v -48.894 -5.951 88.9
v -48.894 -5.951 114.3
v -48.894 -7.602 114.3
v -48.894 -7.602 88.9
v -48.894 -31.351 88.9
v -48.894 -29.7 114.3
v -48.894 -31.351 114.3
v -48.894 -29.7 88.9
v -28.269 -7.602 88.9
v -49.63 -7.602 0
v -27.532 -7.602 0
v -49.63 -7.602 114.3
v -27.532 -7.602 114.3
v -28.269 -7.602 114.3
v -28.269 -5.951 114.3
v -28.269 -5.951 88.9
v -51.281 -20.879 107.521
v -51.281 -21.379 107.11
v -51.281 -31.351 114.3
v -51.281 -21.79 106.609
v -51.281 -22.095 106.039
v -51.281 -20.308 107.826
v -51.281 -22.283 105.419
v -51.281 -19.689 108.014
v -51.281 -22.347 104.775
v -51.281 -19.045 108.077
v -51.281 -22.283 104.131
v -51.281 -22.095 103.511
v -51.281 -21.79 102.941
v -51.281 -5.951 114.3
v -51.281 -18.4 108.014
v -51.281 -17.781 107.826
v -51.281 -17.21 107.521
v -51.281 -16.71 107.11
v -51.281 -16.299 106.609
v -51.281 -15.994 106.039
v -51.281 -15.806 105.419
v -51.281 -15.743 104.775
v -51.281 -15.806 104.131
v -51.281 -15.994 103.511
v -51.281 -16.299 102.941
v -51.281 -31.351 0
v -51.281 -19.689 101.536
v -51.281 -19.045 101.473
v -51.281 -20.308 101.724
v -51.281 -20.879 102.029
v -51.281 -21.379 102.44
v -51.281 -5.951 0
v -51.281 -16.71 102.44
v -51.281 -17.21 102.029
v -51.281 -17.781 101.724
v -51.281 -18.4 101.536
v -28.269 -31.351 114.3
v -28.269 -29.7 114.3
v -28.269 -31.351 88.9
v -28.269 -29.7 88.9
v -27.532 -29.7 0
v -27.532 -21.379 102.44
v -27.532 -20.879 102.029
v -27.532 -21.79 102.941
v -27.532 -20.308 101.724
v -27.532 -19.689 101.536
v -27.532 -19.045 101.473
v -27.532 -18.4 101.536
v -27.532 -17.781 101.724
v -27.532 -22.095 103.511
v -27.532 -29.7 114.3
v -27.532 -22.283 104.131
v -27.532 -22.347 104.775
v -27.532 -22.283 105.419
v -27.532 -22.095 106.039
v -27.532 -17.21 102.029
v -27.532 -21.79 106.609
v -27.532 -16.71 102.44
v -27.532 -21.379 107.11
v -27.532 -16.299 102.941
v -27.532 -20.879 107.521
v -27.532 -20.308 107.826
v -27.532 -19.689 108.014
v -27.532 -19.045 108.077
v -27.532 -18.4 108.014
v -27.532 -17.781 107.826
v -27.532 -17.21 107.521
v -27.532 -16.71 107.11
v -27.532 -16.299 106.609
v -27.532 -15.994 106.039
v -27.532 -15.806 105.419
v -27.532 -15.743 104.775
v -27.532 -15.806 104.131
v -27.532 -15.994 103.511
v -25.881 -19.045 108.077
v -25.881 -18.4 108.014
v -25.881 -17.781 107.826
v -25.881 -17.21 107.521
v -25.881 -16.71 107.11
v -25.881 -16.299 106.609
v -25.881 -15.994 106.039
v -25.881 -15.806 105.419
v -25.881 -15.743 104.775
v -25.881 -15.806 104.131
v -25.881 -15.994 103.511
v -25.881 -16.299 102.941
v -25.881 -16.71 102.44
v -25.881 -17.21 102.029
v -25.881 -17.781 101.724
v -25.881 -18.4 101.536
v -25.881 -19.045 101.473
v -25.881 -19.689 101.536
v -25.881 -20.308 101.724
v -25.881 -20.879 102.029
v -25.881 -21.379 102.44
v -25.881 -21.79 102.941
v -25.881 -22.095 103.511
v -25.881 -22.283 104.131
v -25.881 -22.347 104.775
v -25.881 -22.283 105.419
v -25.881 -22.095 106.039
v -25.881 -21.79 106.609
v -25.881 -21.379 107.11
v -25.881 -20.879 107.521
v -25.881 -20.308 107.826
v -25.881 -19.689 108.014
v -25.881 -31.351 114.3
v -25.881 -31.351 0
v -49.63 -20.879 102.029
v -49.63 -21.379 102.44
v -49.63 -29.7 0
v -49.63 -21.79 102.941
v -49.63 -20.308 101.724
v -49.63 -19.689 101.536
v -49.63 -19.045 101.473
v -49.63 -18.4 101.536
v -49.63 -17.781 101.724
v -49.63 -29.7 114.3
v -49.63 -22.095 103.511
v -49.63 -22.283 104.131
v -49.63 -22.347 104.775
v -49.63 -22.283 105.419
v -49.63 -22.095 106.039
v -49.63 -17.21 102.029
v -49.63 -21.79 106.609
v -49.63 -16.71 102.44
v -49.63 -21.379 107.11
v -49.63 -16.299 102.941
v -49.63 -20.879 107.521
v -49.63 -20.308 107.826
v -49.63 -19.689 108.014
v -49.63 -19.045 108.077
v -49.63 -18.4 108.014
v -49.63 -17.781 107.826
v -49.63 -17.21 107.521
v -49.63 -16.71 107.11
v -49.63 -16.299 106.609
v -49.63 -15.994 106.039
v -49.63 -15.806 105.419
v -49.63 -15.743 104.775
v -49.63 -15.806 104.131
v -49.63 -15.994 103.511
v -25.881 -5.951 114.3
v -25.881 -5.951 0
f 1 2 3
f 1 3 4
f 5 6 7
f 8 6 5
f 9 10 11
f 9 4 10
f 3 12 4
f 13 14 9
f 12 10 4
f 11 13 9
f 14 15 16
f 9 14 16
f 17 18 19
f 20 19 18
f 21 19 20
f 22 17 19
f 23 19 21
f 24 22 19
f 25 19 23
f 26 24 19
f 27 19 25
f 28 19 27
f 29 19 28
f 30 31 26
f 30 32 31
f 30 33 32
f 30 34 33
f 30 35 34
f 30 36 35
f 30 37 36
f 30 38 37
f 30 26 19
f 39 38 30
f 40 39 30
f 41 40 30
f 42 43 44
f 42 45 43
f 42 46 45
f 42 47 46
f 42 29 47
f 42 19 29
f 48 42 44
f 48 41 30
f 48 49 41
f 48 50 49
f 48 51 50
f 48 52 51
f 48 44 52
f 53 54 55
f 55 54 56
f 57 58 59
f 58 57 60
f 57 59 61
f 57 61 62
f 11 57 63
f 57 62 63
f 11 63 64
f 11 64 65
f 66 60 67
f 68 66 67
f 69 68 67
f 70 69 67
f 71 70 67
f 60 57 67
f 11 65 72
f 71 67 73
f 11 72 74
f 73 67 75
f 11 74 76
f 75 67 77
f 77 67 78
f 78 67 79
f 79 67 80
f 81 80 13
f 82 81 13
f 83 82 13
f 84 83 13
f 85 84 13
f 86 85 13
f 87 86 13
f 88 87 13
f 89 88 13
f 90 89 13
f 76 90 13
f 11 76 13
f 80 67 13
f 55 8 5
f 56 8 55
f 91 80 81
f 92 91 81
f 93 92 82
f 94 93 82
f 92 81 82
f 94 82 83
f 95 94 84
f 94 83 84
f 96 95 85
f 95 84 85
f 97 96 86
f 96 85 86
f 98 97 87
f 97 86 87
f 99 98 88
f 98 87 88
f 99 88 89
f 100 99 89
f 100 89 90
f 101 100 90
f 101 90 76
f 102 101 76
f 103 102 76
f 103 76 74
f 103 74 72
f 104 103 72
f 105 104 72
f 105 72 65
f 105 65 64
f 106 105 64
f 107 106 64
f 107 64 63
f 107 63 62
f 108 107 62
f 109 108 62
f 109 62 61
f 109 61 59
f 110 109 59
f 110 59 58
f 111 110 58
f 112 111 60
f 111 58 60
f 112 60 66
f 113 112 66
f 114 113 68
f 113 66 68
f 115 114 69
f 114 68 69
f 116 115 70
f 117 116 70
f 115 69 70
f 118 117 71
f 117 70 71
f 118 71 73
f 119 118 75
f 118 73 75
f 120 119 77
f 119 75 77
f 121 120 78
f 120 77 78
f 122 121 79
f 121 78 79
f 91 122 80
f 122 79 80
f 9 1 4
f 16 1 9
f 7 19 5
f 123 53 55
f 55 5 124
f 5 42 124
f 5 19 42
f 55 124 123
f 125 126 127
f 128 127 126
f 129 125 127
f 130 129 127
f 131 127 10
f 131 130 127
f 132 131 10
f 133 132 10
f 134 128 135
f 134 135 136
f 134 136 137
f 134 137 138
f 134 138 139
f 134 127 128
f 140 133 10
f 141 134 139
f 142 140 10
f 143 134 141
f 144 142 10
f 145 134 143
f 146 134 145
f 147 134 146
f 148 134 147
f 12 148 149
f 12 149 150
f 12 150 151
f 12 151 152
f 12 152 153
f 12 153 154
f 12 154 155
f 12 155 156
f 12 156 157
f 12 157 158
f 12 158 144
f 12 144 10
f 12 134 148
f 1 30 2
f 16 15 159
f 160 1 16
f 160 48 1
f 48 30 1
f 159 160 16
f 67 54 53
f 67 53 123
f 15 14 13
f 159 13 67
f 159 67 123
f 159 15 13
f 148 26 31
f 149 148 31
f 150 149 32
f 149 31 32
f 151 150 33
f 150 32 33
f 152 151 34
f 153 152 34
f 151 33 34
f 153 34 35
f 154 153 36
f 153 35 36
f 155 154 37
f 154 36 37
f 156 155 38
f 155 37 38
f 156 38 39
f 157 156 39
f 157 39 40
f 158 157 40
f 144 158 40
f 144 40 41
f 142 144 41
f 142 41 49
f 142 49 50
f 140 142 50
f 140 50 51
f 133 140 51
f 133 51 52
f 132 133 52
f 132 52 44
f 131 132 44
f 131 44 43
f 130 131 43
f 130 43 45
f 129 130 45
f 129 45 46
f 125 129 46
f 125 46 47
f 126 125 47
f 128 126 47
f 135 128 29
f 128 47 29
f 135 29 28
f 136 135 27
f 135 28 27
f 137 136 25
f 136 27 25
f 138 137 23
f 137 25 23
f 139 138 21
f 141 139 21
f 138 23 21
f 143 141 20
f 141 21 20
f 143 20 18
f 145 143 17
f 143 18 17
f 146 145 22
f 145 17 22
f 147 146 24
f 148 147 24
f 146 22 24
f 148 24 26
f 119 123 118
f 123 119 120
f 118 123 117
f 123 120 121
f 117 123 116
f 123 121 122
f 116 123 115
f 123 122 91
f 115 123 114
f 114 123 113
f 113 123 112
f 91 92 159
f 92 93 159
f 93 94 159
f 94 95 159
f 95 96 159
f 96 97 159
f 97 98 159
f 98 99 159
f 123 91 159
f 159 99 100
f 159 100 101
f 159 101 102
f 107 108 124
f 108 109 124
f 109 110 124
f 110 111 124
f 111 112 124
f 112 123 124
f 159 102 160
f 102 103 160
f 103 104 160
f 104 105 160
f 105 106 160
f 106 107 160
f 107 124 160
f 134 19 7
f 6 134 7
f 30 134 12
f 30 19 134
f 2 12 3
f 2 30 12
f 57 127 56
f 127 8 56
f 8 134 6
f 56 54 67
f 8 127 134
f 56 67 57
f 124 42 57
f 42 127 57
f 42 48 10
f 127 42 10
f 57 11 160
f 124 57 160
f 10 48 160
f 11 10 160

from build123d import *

# Parameters (mm, degrees)
SKETCH1_W           = 25.4
SKETCH1_H           = 25.4
BOSS_EXTRUDE1_DEPTH = 114.3
SKETCH3_W           = 22.098
SKETCH3_H           = 22.098
CUT_EXTRUDE1_DEPTH  = 130.139939168
SKETCH4_W           = 20.6248
SKETCH4_H           = 50.8
CUT_EXTRUDE2_DEPTH  = 128.825773065
SKETCH5_R           = 3.302
CUT_EXTRUDE3_DEPTH  = 122.212646323


with BuildPart() as part:
    # Sketch1 → Boss-Extrude1 (new body)
    with BuildSketch(Plane.XY):
        with Locations((-38.581363669, -18.650528362)):
            Rectangle(SKETCH1_W, SKETCH1_H)
    extrude(amount=BOSS_EXTRUDE1_DEPTH)

    # Sketch3 → Cut-Extrude1 (cut, through all)
    with BuildSketch(Plane.XY.offset(114.3)):
        with Locations((-38.581363669, -18.650528362)):
            Rectangle(SKETCH3_W, SKETCH3_H)
    extrude(amount=-CUT_EXTRUDE1_DEPTH, mode=Mode.SUBTRACT)

    # Sketch4 → Cut-Extrude2 (cut, through all)
    with BuildSketch(Plane(origin=(0, -5.950528362, 0), x_dir=(1, 0, 0), z_dir=(0, 1, 0))):
        with Locations((-38.581363669, -114.3)):
            Rectangle(SKETCH4_W, SKETCH4_H)
    extrude(amount=-CUT_EXTRUDE2_DEPTH, mode=Mode.SUBTRACT)

    # Sketch5 → Cut-Extrude3 (cut, through all)
    with BuildSketch(Plane.ZY.offset(51.281363669)):
        with Locations((104.775, -19.04458559)):
            Circle(SKETCH5_R)
    extrude(amount=-CUT_EXTRUDE3_DEPTH, mode=Mode.SUBTRACT)


solid = part.part
